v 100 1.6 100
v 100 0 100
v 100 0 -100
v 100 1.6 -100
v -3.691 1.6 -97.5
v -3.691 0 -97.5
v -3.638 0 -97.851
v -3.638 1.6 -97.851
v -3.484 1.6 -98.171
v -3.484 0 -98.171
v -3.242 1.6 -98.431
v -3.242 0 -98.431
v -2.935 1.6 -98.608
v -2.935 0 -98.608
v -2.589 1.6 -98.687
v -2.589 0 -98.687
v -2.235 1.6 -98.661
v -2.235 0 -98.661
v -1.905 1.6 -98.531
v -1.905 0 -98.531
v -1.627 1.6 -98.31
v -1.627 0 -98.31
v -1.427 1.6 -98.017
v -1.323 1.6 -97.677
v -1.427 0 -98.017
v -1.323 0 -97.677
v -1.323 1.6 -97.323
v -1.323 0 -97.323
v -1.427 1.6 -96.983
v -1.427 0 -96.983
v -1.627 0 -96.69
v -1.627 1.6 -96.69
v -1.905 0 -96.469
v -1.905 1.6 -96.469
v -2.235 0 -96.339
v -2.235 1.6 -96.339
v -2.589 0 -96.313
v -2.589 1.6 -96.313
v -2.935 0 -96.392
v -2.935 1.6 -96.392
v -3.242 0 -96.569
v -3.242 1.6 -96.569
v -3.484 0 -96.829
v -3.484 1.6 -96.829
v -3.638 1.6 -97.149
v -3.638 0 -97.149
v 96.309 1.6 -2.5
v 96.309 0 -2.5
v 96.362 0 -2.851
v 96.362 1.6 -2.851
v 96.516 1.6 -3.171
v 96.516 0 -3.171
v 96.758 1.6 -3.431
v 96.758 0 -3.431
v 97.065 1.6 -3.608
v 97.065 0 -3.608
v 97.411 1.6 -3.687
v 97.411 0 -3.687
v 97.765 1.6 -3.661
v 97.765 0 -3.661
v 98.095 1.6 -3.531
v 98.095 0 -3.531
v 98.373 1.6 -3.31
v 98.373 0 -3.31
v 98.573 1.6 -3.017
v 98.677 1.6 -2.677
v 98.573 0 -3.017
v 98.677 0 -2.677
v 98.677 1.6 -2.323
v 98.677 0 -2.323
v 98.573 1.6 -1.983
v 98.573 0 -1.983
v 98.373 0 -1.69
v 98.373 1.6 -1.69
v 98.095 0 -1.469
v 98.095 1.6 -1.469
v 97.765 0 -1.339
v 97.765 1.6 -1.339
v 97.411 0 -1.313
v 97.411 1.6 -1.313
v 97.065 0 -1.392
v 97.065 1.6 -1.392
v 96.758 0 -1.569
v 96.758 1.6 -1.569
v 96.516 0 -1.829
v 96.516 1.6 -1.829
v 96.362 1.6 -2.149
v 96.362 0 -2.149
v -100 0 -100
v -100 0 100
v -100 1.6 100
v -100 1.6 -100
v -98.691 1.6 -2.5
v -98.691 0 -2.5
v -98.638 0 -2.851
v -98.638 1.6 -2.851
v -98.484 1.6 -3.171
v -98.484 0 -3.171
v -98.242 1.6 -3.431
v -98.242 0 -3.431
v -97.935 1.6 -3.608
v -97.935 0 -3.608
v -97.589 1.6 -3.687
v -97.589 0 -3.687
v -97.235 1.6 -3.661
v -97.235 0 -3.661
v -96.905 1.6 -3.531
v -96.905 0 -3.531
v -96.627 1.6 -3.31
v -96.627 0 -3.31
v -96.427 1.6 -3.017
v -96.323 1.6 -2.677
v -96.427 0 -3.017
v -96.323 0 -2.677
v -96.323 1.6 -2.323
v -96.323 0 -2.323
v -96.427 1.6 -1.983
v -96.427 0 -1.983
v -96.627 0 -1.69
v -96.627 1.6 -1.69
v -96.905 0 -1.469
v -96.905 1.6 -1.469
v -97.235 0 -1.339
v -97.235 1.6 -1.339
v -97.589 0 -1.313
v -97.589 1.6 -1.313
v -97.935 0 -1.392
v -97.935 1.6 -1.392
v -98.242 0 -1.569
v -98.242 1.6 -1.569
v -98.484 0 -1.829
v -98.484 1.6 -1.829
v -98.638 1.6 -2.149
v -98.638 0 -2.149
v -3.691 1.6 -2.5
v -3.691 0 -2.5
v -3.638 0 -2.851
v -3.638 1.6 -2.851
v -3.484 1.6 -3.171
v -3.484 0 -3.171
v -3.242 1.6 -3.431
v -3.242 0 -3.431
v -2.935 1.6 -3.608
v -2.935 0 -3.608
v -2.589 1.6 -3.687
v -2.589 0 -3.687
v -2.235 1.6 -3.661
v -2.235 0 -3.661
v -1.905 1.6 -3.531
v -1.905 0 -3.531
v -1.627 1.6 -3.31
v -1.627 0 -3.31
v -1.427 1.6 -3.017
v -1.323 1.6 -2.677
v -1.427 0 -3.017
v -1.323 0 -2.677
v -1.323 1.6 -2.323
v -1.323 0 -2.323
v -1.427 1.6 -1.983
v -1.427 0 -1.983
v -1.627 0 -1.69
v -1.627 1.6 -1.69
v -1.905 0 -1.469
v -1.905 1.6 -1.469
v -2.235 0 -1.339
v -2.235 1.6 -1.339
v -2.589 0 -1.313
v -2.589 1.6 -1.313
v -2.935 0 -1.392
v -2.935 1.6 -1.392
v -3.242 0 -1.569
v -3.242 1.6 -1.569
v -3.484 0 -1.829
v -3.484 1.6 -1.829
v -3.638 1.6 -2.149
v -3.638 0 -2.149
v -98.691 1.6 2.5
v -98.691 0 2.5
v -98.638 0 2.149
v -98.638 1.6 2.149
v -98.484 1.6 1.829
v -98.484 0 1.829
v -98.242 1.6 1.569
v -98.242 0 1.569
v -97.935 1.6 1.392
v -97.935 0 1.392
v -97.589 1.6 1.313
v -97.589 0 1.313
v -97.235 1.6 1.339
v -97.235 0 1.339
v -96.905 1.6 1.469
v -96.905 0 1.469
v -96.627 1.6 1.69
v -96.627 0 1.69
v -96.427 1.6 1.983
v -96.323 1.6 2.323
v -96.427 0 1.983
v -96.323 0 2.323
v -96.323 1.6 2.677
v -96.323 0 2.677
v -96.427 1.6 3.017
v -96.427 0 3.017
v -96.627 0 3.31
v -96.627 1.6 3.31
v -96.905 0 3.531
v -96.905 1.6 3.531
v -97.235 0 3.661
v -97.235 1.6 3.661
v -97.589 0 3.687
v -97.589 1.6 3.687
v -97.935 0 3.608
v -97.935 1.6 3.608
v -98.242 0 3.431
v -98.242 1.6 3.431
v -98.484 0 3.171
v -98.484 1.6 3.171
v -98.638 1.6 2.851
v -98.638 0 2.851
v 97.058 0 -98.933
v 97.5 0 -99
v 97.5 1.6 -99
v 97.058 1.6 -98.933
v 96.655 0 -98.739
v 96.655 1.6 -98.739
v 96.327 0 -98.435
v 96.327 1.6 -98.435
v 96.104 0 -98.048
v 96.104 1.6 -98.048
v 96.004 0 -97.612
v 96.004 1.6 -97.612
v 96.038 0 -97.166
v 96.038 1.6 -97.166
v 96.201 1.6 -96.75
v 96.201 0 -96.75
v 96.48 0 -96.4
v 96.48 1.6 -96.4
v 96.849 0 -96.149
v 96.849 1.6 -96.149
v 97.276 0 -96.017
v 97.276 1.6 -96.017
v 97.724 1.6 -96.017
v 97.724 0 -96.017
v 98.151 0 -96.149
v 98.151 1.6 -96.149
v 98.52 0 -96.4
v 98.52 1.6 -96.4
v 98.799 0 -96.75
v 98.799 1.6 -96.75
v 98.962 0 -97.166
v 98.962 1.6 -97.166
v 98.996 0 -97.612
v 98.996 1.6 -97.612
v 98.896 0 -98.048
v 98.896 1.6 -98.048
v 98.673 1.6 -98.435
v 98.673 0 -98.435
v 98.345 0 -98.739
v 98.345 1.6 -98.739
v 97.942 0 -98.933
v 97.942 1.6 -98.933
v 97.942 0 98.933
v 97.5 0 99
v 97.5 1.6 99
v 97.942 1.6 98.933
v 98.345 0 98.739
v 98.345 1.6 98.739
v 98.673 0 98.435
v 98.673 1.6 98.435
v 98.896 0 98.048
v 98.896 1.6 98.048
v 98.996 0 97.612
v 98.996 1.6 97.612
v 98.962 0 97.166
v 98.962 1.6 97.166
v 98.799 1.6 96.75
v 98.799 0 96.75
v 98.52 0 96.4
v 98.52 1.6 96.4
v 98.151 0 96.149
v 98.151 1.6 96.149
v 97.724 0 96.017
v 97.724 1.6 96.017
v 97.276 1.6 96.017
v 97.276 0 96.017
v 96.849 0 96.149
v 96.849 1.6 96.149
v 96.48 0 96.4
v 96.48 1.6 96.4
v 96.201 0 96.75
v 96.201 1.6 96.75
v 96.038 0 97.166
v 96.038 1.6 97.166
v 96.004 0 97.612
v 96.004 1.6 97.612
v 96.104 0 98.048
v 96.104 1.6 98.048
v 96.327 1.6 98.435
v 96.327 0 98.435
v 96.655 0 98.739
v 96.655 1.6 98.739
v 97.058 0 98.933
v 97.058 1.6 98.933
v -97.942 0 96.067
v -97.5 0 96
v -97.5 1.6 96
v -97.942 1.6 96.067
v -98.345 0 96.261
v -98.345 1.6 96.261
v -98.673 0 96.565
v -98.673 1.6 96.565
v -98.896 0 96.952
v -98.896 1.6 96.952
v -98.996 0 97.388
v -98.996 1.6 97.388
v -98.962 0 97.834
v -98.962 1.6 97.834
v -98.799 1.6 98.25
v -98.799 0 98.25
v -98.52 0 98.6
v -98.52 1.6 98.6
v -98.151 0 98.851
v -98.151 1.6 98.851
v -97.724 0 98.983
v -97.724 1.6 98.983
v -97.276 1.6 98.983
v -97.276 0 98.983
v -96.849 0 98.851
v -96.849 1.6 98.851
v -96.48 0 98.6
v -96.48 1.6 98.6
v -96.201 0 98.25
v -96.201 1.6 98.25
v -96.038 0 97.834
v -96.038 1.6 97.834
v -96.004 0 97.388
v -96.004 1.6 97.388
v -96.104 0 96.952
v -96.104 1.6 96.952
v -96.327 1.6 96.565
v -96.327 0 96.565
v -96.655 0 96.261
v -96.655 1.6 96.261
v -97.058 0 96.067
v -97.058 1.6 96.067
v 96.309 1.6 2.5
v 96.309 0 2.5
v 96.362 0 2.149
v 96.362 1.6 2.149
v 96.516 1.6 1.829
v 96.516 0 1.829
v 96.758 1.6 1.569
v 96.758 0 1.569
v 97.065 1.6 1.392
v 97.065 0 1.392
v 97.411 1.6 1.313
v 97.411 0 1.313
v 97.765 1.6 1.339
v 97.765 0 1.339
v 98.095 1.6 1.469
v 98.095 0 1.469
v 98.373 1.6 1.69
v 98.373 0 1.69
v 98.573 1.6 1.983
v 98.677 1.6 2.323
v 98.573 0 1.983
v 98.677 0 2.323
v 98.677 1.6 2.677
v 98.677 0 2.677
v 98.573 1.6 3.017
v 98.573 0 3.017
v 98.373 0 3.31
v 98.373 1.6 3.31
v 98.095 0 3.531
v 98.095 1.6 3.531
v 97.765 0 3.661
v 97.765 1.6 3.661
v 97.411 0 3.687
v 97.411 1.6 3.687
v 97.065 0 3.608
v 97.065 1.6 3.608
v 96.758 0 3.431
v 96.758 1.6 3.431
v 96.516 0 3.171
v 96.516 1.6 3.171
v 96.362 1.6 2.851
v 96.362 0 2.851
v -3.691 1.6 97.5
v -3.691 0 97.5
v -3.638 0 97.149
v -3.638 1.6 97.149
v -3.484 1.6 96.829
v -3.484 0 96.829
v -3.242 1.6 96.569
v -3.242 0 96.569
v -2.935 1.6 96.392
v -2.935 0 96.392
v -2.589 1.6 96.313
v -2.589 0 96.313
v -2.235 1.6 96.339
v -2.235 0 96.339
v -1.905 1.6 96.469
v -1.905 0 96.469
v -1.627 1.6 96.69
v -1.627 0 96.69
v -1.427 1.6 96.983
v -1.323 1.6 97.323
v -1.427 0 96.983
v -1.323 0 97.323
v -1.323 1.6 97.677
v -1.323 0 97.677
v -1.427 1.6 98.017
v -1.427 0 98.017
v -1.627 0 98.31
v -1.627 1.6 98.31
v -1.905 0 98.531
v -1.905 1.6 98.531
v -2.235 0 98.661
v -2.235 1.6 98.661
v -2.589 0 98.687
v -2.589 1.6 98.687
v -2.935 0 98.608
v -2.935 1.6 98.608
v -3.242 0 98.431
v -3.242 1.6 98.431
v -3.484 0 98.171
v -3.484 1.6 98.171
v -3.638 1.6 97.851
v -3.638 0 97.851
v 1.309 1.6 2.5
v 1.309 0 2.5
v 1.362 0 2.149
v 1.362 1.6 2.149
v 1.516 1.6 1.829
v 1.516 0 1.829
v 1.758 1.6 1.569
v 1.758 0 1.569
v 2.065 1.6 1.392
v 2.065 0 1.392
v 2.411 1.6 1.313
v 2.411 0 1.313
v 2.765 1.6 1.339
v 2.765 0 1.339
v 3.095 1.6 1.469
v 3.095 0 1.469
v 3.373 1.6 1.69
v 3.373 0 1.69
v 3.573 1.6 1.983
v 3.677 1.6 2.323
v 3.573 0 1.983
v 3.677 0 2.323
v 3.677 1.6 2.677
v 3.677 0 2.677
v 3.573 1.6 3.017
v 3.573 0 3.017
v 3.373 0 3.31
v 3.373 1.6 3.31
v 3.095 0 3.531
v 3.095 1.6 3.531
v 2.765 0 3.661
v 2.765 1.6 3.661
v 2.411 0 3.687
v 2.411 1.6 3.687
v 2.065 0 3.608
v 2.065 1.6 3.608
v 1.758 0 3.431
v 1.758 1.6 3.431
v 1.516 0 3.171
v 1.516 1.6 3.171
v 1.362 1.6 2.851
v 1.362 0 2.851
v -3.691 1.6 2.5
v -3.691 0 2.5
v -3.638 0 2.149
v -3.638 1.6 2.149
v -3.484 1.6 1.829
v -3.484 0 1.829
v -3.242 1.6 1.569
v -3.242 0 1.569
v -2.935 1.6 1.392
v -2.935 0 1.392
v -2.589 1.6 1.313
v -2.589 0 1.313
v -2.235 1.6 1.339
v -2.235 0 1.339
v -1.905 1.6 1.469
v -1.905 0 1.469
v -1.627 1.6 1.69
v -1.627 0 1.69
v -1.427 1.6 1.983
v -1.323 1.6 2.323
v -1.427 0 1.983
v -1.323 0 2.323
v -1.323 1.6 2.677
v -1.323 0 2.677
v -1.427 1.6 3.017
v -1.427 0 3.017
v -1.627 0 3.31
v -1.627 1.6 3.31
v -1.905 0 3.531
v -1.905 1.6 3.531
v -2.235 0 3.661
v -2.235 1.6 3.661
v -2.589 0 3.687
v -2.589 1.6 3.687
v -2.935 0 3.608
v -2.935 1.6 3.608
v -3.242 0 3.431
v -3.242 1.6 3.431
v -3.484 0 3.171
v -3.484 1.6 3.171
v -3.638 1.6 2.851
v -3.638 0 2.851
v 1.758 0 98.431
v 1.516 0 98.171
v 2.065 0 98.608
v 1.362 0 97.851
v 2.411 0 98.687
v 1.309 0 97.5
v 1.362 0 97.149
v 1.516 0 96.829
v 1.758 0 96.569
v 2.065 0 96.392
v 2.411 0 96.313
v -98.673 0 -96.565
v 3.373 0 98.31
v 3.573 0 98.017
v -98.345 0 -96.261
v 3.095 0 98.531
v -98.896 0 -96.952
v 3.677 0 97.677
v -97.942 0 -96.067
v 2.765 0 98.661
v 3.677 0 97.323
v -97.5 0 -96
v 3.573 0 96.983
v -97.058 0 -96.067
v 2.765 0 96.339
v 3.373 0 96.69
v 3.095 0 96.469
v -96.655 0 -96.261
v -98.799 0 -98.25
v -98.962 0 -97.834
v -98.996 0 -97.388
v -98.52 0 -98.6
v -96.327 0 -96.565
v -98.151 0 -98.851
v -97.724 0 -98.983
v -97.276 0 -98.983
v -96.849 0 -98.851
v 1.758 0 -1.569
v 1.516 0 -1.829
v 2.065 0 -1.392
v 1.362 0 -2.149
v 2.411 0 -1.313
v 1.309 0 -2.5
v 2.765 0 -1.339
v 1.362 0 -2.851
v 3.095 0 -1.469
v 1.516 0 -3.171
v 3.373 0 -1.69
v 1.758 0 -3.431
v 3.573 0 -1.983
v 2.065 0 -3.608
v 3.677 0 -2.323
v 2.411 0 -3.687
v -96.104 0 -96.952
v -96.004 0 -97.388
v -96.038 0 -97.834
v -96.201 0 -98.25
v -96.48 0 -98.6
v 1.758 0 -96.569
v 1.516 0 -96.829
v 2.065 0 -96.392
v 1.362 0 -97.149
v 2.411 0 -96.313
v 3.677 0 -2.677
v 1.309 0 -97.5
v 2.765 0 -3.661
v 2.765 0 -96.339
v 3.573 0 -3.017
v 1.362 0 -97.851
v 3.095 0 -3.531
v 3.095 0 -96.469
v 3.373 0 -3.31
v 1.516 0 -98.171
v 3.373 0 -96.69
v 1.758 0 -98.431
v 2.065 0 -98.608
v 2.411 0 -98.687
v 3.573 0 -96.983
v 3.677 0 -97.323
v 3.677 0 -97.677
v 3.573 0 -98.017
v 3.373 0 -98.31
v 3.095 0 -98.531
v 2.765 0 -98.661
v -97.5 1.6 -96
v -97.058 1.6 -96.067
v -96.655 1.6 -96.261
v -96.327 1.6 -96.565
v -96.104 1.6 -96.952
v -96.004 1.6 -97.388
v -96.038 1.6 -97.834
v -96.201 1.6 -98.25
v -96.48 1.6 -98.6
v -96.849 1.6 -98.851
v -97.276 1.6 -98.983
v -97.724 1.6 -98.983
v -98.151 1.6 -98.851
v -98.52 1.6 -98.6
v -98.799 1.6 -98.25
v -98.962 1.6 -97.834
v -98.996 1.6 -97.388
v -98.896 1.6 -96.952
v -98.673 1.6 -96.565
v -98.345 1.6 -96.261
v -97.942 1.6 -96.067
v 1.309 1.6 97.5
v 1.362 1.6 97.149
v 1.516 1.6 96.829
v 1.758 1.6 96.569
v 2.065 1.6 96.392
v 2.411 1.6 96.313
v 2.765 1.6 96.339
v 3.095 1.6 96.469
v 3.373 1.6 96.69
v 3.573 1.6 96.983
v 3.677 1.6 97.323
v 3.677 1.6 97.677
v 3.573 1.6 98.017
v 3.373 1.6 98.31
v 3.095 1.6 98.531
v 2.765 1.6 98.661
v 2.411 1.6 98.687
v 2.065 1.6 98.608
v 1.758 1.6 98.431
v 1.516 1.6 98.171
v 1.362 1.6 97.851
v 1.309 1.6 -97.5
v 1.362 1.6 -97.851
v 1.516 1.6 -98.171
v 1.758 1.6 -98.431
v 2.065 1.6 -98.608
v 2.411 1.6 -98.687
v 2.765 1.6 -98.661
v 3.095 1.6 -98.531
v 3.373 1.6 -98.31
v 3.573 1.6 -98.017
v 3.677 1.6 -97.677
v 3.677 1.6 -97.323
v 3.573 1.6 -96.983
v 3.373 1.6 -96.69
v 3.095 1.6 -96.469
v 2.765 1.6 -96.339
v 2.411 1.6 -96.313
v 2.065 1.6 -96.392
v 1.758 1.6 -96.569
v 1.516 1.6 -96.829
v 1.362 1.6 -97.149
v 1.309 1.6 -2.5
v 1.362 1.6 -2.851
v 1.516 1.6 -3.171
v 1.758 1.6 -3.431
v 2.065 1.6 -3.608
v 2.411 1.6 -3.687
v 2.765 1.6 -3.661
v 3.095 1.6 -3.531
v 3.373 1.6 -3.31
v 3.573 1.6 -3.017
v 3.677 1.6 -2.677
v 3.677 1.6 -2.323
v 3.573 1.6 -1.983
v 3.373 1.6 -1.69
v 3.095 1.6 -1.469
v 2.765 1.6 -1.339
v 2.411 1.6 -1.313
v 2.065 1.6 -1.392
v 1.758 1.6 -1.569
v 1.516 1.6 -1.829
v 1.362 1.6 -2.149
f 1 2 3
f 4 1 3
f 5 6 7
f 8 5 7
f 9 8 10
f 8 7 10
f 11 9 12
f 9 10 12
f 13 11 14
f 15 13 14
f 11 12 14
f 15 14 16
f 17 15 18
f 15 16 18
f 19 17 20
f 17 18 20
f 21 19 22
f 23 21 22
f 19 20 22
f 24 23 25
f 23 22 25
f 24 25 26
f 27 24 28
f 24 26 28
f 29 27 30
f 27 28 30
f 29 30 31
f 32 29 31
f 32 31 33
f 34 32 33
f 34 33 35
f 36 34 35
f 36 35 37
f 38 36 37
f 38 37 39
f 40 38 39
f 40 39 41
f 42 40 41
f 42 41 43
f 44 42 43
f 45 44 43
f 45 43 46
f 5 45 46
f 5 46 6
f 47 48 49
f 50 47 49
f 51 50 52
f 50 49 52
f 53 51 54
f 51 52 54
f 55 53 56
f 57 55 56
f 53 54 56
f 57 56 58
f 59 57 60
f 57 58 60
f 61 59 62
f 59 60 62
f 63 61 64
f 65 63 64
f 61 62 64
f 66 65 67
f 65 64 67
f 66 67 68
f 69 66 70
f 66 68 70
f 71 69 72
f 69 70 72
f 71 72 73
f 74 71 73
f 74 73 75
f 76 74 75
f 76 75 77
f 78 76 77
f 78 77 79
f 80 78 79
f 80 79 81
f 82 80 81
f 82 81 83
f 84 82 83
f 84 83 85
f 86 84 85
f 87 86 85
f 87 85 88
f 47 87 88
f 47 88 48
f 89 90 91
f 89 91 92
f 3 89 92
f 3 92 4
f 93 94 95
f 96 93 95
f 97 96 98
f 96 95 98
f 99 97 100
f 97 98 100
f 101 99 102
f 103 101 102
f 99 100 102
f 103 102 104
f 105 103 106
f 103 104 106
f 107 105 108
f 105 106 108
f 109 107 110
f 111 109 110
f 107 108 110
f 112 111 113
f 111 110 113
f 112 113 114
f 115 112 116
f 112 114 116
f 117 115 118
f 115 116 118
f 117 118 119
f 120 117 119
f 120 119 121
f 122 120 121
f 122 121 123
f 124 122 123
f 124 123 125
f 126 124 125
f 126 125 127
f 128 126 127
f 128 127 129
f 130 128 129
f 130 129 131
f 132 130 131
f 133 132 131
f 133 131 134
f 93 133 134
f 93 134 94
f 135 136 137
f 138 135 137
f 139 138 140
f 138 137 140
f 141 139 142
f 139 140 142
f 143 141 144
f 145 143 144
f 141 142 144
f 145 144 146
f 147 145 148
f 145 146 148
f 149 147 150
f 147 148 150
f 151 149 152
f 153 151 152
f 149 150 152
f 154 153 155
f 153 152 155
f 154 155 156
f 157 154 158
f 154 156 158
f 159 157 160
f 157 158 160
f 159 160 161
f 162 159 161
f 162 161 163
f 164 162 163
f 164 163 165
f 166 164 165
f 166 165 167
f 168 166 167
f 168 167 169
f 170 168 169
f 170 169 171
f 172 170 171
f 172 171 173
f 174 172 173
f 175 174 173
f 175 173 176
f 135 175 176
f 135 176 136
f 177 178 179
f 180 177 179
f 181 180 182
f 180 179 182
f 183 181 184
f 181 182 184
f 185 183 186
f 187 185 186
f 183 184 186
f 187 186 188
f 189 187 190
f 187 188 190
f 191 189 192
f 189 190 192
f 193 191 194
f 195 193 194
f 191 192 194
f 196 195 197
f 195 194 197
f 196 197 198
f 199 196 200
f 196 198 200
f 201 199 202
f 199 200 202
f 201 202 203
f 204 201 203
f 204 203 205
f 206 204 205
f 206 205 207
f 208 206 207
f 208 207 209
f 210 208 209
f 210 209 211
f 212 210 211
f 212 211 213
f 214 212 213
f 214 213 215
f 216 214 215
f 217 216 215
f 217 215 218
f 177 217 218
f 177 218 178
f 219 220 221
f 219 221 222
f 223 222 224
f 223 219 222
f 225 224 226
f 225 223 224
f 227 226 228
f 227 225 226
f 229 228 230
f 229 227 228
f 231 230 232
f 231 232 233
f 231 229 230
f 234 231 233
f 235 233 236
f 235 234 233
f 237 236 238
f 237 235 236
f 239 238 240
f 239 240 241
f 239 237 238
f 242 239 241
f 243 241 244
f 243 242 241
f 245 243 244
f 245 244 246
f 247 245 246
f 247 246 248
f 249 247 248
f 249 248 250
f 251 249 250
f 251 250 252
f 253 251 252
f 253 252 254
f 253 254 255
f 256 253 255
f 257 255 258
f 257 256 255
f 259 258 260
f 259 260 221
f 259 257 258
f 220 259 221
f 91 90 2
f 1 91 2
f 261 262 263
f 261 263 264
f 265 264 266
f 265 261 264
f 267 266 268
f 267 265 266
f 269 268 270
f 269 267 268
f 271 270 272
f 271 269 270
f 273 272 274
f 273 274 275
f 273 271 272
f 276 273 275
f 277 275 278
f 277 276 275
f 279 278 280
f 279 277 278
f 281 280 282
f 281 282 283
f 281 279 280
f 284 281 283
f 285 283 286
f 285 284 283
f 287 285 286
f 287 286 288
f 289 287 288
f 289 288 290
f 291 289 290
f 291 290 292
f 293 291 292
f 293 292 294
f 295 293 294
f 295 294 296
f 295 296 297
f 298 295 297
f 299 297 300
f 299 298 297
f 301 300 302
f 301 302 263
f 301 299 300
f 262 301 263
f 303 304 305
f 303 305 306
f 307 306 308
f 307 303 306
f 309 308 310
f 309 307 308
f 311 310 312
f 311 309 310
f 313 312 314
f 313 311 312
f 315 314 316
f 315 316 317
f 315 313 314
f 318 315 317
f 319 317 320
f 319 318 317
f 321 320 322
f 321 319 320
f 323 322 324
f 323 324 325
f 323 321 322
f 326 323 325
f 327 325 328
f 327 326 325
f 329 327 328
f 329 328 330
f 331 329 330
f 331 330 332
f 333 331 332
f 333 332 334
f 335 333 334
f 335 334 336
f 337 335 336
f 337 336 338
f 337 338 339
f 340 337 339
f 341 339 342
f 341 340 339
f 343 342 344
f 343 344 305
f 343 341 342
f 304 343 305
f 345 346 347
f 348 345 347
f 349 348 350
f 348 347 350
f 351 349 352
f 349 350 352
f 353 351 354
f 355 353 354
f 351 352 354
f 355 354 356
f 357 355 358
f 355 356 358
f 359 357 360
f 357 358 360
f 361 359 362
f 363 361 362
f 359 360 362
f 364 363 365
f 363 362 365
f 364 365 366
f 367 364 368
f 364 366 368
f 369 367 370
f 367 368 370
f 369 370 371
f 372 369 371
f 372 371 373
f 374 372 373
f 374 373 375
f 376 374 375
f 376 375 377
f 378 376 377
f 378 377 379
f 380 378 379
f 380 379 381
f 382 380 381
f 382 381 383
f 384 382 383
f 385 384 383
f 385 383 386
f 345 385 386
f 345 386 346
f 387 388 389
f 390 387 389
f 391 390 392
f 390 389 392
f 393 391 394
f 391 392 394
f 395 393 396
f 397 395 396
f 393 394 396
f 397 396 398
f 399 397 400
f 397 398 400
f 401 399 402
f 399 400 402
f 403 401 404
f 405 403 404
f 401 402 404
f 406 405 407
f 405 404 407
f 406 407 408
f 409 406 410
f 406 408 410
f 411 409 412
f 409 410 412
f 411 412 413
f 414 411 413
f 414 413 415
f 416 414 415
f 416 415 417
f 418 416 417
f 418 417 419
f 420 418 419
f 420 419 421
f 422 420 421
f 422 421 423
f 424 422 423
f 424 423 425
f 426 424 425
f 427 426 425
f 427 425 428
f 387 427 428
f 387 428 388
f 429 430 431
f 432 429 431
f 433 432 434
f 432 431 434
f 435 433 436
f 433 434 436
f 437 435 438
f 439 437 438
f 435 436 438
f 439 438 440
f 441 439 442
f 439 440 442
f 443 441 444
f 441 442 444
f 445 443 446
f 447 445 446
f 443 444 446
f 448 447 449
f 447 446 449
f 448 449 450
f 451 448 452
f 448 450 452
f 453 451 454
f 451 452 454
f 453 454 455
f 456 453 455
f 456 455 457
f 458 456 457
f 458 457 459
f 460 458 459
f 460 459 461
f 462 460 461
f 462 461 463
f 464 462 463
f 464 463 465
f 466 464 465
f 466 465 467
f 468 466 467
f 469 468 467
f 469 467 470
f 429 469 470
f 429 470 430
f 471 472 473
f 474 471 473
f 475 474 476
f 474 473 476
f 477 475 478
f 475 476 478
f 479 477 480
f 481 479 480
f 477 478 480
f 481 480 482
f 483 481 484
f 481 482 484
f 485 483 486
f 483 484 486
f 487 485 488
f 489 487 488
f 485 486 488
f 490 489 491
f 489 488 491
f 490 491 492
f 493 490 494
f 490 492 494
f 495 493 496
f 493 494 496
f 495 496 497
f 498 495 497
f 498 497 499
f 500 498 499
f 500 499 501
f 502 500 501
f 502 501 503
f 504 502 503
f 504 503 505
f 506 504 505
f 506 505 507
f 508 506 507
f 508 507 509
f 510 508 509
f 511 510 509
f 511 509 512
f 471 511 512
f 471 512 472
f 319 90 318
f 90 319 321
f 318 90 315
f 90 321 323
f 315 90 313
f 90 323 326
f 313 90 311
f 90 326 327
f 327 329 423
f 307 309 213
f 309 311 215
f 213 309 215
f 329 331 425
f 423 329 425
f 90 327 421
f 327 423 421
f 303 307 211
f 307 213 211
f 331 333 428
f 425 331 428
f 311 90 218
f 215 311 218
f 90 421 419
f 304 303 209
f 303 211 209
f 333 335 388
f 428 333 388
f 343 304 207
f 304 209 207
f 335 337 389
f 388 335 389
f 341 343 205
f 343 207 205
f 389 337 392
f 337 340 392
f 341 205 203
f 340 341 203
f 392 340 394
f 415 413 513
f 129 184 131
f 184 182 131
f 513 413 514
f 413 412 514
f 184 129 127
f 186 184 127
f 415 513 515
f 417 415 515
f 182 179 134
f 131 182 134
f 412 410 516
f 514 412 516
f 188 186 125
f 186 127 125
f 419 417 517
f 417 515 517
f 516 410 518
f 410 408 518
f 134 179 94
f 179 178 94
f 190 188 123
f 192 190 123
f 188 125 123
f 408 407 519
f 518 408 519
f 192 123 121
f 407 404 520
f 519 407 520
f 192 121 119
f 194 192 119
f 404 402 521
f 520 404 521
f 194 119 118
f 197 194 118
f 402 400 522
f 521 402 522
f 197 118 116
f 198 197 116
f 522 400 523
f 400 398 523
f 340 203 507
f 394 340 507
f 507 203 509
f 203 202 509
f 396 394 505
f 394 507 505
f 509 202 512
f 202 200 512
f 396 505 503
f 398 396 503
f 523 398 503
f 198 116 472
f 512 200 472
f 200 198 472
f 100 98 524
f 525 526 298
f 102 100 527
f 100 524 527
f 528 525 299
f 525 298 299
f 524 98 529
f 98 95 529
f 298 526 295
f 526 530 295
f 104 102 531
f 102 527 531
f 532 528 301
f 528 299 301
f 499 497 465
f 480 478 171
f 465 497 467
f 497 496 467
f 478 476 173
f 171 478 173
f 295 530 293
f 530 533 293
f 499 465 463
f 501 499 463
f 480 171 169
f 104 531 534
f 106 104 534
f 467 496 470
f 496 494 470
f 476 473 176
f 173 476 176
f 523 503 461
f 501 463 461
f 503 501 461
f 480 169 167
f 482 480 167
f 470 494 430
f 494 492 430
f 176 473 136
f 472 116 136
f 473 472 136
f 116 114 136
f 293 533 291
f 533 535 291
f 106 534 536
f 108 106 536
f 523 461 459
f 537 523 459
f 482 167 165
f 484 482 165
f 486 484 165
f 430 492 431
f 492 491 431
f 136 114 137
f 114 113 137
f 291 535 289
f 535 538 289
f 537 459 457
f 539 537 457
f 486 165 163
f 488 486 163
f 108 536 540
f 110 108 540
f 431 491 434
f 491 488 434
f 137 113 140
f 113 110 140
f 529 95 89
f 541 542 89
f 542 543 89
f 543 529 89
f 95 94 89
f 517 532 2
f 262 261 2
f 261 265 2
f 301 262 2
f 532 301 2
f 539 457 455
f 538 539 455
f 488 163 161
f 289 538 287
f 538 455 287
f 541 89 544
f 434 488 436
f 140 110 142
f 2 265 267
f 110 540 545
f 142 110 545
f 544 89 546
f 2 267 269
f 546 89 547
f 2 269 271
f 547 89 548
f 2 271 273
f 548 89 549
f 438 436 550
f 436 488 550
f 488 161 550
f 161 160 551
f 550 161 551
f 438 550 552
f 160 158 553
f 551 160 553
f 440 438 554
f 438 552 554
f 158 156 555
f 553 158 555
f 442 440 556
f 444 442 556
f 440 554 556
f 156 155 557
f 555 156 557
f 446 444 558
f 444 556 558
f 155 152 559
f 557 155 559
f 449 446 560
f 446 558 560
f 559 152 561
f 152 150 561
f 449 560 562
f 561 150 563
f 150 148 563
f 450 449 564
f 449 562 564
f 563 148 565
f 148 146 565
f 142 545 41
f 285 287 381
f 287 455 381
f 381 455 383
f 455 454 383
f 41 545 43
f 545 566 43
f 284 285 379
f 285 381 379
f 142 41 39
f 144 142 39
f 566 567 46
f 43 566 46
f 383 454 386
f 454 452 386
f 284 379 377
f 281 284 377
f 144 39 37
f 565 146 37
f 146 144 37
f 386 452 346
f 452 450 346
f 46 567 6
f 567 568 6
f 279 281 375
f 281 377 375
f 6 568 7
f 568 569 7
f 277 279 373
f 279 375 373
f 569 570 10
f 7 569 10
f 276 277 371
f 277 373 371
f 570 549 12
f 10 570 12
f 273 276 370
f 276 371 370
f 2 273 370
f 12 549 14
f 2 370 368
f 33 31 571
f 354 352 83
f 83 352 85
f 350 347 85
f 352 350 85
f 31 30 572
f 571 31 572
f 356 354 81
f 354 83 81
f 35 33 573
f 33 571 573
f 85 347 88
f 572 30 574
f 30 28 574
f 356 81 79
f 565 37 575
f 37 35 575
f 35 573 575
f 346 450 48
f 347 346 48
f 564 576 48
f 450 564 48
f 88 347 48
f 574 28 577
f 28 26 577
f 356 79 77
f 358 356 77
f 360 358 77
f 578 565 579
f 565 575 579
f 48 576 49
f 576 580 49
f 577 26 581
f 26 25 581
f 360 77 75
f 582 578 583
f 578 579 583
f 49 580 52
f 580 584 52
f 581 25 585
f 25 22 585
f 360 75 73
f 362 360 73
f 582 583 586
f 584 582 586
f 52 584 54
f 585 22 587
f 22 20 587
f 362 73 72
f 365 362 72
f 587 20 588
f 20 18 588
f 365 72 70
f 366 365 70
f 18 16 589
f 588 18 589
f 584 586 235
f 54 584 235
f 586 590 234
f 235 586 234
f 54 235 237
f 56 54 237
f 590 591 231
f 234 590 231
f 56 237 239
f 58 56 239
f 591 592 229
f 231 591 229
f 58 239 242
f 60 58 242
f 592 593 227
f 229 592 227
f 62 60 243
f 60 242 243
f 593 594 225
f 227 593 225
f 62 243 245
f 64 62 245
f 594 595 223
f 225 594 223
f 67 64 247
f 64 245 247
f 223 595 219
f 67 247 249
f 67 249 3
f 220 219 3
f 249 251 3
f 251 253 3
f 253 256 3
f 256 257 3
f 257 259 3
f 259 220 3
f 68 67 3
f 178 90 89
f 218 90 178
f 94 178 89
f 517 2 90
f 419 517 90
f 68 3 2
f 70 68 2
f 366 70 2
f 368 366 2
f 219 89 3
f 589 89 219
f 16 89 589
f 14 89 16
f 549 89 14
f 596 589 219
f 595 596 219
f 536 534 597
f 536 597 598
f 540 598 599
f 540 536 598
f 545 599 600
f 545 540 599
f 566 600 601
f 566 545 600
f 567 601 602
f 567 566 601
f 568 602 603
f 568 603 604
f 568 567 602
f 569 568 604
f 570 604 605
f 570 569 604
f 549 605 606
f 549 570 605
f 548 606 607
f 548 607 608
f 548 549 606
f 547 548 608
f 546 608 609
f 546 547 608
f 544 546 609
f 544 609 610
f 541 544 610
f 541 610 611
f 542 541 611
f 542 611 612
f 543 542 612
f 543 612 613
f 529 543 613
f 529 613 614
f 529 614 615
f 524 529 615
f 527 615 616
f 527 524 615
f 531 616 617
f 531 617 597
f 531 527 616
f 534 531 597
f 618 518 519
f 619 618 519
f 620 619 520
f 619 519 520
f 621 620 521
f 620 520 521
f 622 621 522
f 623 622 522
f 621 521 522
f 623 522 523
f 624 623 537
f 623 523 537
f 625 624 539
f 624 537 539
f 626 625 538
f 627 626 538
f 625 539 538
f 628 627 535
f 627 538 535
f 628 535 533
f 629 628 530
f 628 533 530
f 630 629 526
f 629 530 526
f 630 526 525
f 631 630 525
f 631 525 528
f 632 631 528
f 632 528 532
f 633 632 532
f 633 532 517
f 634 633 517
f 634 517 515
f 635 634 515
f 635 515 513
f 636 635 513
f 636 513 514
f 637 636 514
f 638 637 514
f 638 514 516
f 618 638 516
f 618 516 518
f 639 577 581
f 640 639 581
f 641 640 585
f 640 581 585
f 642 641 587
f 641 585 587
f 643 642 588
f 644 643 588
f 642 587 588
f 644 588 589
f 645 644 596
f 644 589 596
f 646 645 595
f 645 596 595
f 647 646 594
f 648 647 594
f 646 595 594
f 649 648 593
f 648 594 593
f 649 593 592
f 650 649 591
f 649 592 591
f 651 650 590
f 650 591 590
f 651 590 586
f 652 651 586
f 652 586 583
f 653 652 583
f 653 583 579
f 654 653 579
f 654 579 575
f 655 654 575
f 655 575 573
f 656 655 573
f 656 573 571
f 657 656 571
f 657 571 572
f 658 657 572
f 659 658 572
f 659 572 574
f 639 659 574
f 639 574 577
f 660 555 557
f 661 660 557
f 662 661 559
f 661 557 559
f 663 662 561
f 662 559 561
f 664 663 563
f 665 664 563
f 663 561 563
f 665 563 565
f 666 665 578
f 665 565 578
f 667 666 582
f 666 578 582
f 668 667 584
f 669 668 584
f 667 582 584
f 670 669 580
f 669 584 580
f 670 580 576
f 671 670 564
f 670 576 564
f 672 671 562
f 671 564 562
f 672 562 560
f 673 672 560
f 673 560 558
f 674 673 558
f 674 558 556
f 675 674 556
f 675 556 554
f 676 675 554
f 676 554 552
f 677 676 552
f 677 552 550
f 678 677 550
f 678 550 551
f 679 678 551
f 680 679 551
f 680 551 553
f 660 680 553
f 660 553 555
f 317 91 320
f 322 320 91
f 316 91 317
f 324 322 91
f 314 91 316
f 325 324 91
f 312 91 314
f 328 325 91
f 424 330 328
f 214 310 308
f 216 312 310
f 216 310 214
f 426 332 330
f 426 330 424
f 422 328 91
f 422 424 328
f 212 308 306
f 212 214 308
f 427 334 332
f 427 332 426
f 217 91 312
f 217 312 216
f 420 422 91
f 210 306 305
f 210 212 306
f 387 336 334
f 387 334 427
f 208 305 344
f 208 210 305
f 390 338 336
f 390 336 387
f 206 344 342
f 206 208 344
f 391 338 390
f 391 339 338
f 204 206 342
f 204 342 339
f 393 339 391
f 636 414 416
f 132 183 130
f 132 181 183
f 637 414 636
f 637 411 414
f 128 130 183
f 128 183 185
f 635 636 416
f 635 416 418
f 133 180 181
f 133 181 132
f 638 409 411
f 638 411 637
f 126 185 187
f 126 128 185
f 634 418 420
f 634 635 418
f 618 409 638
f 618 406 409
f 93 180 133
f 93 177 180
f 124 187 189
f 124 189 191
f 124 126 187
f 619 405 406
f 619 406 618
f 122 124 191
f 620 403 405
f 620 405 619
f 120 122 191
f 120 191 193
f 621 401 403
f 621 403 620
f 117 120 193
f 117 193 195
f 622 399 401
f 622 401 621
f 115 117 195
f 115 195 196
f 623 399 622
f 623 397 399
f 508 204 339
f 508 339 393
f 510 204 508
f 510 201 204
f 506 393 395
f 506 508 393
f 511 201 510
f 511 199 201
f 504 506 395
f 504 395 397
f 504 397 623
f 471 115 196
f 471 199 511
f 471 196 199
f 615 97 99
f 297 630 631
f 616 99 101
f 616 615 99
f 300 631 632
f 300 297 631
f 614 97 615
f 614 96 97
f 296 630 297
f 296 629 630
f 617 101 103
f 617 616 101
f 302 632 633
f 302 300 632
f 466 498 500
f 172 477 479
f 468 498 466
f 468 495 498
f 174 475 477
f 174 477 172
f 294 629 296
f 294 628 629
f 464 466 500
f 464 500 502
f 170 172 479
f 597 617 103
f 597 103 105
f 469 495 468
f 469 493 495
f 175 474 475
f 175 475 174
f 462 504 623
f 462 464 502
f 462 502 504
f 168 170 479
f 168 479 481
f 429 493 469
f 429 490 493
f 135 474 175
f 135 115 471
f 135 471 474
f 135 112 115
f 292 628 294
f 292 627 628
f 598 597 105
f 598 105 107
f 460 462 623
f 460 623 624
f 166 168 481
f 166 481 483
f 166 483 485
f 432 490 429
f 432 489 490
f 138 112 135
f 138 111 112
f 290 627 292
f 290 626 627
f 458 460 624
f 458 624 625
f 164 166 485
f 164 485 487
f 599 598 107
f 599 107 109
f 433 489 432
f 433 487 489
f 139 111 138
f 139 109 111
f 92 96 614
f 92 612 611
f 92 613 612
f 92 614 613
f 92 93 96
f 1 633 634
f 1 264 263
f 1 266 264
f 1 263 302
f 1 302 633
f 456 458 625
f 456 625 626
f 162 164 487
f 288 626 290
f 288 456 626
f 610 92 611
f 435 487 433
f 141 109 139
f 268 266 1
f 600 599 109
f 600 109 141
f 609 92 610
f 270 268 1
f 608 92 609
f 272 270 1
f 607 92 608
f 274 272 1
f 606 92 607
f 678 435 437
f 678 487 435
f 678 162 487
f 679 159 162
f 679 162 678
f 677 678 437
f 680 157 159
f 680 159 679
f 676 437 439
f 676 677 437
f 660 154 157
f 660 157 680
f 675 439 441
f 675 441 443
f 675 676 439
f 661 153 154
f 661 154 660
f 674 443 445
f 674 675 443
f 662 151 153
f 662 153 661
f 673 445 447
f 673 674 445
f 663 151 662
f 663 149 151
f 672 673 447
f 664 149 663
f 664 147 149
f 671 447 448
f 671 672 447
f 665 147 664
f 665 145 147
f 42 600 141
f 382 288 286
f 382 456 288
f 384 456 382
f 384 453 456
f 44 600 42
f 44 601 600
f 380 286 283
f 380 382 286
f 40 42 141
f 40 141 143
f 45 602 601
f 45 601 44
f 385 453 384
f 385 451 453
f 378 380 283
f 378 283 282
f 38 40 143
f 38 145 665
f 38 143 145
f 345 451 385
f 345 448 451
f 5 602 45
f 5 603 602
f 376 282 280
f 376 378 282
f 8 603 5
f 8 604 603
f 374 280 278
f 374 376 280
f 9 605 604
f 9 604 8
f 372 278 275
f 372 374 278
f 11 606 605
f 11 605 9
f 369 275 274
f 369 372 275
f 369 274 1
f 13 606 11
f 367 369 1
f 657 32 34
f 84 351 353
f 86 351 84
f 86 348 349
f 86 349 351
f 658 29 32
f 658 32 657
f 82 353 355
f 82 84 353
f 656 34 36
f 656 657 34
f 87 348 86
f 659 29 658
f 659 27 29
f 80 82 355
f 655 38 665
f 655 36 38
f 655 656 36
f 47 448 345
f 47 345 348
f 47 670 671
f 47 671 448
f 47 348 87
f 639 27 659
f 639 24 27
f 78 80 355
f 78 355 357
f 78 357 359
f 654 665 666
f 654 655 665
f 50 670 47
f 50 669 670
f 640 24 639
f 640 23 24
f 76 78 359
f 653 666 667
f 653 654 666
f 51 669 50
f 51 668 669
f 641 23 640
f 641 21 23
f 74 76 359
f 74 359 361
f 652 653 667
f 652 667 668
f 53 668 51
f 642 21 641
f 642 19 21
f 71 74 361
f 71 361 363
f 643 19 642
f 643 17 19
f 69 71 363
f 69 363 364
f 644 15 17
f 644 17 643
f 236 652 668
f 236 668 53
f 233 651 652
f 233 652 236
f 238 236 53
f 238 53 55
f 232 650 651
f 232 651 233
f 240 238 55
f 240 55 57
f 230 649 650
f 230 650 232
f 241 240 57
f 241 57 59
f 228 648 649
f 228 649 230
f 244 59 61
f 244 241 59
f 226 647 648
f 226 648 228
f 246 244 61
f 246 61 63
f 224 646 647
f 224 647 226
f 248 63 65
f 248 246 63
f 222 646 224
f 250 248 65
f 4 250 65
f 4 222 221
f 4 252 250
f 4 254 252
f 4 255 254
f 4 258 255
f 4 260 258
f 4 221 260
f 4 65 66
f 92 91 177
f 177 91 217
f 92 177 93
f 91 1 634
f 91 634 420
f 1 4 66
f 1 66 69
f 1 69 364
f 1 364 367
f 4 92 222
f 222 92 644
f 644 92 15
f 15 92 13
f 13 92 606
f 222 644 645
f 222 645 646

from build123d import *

# Parameters (mm, degrees)
SKETCH1_W                       = 200
SKETCH1_H                       = 200
SKETCH1_R                       = 1.5
BOSS_EXTRUDE2_DEPTH             = 1.6
F_3_32_0_09375_DIAMETER_HOLE1_D = 2.38125


with BuildPart() as part:
    # Sketch1 → Boss-Extrude2 (new body)
    with BuildSketch(Plane(origin=(0, 0, 0), x_dir=(1, 0, 0), z_dir=(0, 1, 0))):
        Rectangle(SKETCH1_W, SKETCH1_H)
        with Locations(Location((-97.5, 97.5, 0), (0, 0, 270))):
            Circle(SKETCH1_R, mode=Mode.SUBTRACT)
        with Locations(Location((97.5, 97.5, 0), (0, 0, 90))):
            Circle(SKETCH1_R, mode=Mode.SUBTRACT)
        with Locations(Location((-97.5, -97.5, 0), (0, 0, 90))):
            Circle(SKETCH1_R, mode=Mode.SUBTRACT)
        with Locations(Location((97.5, -97.5, 0), (0, 0, 270))):
            Circle(SKETCH1_R, mode=Mode.SUBTRACT)
    extrude(amount=BOSS_EXTRUDE2_DEPTH)

    # 3/32 (0.09375) Diameter Hole1 (through all)
    with Locations(Plane(origin=(0, 1.6, 0), x_dir=(1, 0, 0), z_dir=(0, 1, 0))):
        with Locations((2.5, -97.5), (-2.5, -97.5), (2.5, -2.5), (-2.5, -2.5), (-2.5, 2.5), (2.5, 2.5), (-97.5, -2.5), (-97.5, 2.5), (97.5, -2.5), (97.5, 2.5), (2.5, 97.5), (-2.5, 97.5)):
            Hole(F_3_32_0_09375_DIAMETER_HOLE1_D / 2)


solid = part.part
